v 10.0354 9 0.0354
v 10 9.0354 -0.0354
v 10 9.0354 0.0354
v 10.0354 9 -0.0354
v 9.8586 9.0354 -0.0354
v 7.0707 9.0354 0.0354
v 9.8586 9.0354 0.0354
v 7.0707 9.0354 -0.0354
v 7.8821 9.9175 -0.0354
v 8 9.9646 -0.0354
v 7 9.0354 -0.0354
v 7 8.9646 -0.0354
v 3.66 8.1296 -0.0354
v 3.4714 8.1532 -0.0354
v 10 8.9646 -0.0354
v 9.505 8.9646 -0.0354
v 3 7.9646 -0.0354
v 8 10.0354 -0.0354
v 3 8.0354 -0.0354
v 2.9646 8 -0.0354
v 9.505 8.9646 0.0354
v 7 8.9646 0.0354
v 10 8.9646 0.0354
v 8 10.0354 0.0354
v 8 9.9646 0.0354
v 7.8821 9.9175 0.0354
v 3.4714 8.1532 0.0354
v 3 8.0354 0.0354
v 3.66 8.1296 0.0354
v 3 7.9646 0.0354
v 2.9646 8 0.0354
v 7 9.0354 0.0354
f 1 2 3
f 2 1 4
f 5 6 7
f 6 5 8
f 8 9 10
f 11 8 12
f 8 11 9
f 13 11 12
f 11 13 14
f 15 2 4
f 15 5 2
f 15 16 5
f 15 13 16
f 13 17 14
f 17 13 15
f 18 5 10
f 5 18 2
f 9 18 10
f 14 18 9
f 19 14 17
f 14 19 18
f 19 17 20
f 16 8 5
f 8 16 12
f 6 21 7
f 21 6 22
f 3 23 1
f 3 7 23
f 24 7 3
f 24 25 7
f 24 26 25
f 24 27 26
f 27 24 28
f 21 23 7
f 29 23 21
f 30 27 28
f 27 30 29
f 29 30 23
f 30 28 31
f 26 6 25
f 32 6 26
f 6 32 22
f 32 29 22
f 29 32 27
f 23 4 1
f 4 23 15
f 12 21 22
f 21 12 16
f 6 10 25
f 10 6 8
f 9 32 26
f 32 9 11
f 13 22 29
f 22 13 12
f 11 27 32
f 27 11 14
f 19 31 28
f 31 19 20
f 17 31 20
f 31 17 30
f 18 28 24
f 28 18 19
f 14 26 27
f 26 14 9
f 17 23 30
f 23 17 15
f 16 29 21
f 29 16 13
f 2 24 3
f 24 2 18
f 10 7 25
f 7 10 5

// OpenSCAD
//The centroid of a triangle

function rnd_v(init_value,end_value)=round(rands(init_value,end_value,1)[0]);

module draw_line(p1,p2,thickness,fn=4){
    $fn=fn;
    
    hull(){
        translate(p1)sphere(thickness/2);
        translate(p2)sphere(thickness/2);
        } 
    }
    
module polyline_3D(points,thickness,fn=4){
    module polyline3D_inner(points,index){
         if (index<len(points)){
             draw_line(points[index-1],points[index],thickness,fn);
             polyline3D_inner(points,index+1);
         }  
         else if(index==len(points)){
             draw_line(points[index-1],points[0],thickness,fn);}
    }
    polyline3D_inner(points,1);
}


   

function p(init_v,end_v)=[
     [rnd_v(init_v,end_v),rnd_v(init_v,end_v)],
     [rnd_v(init_v,end_v),rnd_v(init_v,end_v)],
     [rnd_v(init_v,end_v),rnd_v(init_v,end_v)]];


function all_point(init_v,end_v)=
     let(points=p(init_v,end_v))
     let (m1=(points.y.y-points.x.y)/(points.y.x-points.x.x))
     let(m2=(points.z.y-points.y.y)/(points.z.x-points.y.x))
      points.x==points.y==points.z ||
      points.x==points.y ||
      points.y==points.z ||
      points.z==points.x ||
      points.x.x==points.y.x==points.z.x?
      all_point(init_v,end_v):
      points.x.x==points.y.x||
      points.y.x==points.z.x||
      points.z.x==points.x.x?
      points:
      m1==m2?
      all_point(init_v,end_v):
      points;
      
    
function centroid(points)=
     [(points.x.x+points.y.x+points.z.x)/3,
      (points.x.y+points.y.y+points.z.y)/3,
     ];



points=(all_point(0,10));
test=centroid(points);

for(i=points)
    draw_line(i,test,0.1,fn=4);


polyline_3D(points,0.1,fn=4);
